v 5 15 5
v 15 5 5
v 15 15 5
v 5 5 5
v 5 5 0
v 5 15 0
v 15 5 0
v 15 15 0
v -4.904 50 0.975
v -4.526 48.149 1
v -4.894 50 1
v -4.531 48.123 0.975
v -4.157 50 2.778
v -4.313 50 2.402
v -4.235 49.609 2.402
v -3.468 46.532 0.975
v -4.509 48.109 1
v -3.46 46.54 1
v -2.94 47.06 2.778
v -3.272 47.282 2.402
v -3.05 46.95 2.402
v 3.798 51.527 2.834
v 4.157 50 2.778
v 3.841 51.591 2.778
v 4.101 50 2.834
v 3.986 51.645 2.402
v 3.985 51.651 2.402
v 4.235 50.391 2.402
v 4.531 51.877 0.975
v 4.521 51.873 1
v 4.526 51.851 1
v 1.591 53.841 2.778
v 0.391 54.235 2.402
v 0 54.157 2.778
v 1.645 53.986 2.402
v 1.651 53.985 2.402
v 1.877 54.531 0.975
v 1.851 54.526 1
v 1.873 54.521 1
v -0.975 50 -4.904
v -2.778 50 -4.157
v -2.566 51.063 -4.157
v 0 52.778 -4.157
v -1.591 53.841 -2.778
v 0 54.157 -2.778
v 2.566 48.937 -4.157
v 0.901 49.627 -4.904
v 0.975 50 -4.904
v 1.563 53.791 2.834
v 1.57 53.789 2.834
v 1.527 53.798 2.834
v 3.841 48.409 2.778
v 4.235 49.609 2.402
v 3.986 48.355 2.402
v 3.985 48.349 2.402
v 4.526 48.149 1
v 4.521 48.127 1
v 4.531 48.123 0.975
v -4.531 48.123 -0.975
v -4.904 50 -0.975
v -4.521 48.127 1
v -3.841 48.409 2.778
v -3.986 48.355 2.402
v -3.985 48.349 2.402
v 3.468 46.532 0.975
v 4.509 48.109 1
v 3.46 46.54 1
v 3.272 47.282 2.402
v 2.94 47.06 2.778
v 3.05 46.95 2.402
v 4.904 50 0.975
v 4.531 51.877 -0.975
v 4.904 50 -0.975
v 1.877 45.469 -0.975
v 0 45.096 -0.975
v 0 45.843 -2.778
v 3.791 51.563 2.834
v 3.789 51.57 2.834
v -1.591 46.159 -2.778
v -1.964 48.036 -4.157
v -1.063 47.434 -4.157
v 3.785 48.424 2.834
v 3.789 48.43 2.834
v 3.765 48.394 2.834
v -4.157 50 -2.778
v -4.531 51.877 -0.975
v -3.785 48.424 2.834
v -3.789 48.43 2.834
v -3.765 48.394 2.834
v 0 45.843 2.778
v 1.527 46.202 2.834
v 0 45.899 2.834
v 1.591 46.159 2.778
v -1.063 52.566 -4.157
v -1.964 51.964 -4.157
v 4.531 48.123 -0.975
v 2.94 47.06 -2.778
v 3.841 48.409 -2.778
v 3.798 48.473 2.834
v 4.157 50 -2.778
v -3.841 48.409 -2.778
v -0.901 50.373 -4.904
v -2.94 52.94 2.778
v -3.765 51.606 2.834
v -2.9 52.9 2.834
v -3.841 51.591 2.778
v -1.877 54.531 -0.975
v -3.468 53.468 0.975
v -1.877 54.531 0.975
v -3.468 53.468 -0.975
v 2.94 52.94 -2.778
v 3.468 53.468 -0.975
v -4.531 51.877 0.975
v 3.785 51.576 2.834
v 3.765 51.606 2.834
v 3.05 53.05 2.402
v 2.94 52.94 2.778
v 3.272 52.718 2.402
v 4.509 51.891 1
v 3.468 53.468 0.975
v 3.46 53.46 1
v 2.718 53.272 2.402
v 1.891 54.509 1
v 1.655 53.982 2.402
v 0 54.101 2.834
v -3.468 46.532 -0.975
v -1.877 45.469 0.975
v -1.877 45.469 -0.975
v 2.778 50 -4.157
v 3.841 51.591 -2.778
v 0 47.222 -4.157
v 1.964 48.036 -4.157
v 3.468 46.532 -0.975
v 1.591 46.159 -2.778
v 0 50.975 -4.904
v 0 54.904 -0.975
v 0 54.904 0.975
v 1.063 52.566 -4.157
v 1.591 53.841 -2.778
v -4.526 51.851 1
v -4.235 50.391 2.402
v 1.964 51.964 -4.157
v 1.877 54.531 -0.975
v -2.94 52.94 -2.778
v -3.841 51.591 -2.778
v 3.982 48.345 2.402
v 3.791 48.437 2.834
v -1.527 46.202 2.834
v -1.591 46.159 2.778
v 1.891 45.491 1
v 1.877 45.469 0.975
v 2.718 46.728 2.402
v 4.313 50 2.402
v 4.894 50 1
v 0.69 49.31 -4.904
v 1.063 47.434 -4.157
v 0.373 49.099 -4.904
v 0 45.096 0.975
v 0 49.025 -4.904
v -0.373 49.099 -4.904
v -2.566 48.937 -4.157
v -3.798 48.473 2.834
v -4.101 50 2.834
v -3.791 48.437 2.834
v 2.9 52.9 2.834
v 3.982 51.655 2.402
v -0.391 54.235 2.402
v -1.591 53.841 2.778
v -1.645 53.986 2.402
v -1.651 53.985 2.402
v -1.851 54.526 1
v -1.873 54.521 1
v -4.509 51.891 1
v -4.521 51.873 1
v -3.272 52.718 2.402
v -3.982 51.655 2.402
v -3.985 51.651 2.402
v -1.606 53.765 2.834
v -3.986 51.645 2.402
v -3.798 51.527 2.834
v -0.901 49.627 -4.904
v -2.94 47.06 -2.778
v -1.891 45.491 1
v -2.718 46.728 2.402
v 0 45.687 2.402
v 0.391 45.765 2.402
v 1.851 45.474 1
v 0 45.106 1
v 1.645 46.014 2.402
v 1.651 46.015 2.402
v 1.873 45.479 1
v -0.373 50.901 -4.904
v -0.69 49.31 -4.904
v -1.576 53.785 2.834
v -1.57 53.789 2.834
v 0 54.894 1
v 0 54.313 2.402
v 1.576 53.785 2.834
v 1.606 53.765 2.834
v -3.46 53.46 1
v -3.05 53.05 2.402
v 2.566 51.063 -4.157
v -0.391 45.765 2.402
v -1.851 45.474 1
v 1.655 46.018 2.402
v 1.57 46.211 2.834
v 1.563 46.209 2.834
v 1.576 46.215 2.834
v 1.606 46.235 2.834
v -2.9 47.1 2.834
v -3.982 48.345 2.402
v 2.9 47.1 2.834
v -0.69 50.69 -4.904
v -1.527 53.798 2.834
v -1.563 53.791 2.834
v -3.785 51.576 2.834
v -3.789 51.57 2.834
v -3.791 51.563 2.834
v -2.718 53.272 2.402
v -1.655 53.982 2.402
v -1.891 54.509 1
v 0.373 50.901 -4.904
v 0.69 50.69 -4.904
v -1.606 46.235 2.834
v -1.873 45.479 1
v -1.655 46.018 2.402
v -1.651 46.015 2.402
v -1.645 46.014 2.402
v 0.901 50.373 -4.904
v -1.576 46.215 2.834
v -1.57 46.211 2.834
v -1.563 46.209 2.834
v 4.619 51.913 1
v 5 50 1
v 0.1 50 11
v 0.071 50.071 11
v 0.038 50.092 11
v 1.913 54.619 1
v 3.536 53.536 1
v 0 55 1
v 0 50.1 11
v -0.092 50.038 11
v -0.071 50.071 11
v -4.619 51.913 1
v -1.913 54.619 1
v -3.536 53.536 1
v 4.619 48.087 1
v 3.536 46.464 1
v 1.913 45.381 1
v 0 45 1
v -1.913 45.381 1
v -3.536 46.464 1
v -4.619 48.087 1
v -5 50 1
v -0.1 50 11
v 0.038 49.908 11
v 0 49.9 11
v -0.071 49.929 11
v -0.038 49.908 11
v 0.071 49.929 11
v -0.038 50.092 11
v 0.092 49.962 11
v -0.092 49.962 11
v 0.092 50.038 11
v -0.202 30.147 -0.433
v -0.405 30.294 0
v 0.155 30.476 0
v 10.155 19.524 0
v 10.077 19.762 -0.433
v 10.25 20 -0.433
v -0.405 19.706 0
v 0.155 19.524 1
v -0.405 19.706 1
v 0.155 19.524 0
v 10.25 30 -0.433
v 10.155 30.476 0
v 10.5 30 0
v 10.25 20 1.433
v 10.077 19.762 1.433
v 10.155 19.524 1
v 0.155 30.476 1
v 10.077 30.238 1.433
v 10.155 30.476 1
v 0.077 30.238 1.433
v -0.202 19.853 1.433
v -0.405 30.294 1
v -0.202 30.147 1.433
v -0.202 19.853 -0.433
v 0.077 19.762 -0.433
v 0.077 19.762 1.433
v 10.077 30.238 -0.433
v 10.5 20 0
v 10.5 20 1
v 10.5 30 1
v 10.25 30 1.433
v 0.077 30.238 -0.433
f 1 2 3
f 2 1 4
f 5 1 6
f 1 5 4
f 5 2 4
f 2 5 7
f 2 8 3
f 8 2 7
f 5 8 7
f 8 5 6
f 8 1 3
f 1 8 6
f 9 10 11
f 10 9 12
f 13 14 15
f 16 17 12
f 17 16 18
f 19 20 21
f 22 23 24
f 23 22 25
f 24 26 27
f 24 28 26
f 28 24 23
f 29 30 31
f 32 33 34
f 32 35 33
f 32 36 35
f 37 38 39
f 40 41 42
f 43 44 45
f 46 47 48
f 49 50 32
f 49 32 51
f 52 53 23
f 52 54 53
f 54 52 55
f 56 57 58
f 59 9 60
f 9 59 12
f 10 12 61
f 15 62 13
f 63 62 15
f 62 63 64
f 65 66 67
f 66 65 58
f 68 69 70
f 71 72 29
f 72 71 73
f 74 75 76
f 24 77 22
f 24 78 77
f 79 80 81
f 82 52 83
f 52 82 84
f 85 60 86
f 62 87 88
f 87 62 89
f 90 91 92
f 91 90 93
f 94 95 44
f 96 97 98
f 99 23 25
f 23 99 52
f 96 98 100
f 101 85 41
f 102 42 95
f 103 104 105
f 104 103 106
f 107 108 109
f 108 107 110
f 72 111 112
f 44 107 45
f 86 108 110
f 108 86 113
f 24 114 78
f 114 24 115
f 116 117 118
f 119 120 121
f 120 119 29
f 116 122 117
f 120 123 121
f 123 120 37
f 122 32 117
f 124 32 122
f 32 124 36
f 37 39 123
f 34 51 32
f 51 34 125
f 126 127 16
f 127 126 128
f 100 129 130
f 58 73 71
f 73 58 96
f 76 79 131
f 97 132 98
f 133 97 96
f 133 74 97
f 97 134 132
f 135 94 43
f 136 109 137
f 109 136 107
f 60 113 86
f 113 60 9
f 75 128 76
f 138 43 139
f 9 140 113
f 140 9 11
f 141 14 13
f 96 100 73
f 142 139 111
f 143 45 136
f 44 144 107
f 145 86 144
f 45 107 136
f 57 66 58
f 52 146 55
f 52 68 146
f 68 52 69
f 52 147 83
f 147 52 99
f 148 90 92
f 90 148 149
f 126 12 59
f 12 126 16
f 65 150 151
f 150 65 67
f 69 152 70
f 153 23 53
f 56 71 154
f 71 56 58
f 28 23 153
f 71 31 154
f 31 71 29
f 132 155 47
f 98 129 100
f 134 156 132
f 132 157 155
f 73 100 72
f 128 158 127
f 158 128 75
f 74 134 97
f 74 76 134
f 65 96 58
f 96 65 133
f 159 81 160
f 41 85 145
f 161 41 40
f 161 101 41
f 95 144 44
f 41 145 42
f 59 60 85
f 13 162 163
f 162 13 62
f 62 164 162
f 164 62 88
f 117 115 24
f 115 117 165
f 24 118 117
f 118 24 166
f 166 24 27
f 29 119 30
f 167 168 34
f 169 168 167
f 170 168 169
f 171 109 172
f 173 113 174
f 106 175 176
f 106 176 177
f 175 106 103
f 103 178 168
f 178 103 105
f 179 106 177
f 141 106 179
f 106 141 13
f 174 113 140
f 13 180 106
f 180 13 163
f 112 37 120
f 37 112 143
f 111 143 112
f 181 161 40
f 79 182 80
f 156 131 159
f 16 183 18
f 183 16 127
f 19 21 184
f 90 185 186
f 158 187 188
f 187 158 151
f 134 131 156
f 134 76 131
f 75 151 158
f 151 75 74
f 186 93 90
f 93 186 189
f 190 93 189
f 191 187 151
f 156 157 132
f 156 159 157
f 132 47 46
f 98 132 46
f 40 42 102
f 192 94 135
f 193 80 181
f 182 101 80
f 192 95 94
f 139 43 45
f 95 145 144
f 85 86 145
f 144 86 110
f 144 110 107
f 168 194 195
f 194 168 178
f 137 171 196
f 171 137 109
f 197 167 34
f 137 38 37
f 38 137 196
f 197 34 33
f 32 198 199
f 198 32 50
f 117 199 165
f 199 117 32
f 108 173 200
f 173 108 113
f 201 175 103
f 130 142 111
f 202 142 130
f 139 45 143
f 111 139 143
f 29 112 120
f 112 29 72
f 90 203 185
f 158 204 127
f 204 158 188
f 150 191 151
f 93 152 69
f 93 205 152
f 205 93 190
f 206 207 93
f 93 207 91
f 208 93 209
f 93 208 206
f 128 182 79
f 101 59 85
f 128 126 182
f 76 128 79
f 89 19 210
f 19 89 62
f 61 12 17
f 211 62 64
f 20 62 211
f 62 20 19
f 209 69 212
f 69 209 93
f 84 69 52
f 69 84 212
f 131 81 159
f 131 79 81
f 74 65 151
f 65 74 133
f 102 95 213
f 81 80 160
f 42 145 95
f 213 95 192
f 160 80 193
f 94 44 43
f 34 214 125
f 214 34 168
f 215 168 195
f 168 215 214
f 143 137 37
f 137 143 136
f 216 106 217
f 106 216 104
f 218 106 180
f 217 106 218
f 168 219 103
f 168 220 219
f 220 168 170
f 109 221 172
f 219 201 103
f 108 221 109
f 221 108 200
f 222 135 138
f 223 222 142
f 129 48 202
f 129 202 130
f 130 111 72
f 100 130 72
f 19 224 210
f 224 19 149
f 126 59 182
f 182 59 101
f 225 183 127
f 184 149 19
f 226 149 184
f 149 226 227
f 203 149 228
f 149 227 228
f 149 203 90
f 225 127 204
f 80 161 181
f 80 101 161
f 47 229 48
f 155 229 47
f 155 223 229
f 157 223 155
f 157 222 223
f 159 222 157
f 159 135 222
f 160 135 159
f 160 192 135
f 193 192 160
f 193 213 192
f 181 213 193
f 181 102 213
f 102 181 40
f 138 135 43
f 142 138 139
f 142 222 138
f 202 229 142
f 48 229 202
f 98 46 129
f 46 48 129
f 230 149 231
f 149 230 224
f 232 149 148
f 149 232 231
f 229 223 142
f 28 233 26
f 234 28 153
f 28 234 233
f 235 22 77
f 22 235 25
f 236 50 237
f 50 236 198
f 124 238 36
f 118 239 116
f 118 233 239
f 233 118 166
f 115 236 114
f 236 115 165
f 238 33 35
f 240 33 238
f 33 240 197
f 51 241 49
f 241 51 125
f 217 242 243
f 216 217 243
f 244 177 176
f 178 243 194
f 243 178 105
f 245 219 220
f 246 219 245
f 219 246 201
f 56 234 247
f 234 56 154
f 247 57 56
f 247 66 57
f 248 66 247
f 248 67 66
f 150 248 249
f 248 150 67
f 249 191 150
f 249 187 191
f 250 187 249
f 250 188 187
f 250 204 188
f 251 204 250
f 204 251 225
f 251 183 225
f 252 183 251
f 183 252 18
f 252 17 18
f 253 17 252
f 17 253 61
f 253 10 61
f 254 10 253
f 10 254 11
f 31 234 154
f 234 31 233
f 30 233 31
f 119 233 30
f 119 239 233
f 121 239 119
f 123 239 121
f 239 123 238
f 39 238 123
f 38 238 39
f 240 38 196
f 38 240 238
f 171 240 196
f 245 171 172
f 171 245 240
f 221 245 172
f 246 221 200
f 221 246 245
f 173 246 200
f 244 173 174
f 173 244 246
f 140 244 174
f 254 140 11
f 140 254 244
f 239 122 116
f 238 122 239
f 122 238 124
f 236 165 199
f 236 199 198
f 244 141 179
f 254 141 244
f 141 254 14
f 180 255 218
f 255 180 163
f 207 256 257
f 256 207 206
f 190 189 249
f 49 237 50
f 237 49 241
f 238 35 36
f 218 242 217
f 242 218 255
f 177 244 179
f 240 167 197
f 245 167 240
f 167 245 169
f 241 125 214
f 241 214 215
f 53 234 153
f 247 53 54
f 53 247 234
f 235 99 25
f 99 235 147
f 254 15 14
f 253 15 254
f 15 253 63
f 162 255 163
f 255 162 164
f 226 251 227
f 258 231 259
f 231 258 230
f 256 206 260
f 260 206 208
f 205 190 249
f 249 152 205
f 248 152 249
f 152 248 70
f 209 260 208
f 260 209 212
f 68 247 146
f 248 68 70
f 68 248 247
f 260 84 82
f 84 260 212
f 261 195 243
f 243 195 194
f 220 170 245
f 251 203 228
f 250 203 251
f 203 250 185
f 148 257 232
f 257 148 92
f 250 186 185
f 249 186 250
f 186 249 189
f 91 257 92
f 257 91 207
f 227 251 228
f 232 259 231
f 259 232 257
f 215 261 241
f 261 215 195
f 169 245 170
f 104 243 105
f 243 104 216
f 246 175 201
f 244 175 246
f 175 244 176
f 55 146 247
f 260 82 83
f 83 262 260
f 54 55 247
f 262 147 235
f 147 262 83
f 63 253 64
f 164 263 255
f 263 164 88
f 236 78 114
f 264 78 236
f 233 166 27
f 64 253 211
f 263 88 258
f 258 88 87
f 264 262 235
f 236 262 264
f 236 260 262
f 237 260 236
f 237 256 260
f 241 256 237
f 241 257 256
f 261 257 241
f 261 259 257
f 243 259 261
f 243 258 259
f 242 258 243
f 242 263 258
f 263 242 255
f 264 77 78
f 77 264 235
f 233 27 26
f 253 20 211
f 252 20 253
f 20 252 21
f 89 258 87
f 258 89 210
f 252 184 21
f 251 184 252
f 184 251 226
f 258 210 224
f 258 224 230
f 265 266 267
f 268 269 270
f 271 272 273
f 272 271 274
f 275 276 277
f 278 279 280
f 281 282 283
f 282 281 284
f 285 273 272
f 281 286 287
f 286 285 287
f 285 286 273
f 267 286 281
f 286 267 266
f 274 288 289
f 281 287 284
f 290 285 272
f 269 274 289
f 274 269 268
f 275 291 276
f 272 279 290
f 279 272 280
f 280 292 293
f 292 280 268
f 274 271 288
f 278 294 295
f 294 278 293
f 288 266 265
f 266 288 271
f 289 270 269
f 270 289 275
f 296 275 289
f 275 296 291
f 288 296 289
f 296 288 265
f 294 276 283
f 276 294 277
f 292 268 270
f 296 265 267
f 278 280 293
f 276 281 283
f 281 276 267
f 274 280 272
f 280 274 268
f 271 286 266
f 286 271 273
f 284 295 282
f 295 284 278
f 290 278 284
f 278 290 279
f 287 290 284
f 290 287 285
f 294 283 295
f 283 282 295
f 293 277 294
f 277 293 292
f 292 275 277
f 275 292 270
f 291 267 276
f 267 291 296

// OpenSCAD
color("Black") intersection()
      {
      translate([5,5,0])
            cube([10,10,5]);
      translate([5,5,5])
            sphere(d=10, center=true);
      }
      
color("Red") difference()
      {
      translate([5,5,0])
            cube([10,10,5]);
      translate([5,5,5])
            sphere(d=10, center=true);
      }
      
      
color("Yellow") minkowski()
      {
      translate([0,20,0])
            cube([10,10,1]);
      sphere(r=0.5);
      }
      
color("Blue") union()
      {
      translate([0,50,0])
            sphere(r=5);
      translate([0,50,1])
            cylinder(10, 5, .1);
      }
      
